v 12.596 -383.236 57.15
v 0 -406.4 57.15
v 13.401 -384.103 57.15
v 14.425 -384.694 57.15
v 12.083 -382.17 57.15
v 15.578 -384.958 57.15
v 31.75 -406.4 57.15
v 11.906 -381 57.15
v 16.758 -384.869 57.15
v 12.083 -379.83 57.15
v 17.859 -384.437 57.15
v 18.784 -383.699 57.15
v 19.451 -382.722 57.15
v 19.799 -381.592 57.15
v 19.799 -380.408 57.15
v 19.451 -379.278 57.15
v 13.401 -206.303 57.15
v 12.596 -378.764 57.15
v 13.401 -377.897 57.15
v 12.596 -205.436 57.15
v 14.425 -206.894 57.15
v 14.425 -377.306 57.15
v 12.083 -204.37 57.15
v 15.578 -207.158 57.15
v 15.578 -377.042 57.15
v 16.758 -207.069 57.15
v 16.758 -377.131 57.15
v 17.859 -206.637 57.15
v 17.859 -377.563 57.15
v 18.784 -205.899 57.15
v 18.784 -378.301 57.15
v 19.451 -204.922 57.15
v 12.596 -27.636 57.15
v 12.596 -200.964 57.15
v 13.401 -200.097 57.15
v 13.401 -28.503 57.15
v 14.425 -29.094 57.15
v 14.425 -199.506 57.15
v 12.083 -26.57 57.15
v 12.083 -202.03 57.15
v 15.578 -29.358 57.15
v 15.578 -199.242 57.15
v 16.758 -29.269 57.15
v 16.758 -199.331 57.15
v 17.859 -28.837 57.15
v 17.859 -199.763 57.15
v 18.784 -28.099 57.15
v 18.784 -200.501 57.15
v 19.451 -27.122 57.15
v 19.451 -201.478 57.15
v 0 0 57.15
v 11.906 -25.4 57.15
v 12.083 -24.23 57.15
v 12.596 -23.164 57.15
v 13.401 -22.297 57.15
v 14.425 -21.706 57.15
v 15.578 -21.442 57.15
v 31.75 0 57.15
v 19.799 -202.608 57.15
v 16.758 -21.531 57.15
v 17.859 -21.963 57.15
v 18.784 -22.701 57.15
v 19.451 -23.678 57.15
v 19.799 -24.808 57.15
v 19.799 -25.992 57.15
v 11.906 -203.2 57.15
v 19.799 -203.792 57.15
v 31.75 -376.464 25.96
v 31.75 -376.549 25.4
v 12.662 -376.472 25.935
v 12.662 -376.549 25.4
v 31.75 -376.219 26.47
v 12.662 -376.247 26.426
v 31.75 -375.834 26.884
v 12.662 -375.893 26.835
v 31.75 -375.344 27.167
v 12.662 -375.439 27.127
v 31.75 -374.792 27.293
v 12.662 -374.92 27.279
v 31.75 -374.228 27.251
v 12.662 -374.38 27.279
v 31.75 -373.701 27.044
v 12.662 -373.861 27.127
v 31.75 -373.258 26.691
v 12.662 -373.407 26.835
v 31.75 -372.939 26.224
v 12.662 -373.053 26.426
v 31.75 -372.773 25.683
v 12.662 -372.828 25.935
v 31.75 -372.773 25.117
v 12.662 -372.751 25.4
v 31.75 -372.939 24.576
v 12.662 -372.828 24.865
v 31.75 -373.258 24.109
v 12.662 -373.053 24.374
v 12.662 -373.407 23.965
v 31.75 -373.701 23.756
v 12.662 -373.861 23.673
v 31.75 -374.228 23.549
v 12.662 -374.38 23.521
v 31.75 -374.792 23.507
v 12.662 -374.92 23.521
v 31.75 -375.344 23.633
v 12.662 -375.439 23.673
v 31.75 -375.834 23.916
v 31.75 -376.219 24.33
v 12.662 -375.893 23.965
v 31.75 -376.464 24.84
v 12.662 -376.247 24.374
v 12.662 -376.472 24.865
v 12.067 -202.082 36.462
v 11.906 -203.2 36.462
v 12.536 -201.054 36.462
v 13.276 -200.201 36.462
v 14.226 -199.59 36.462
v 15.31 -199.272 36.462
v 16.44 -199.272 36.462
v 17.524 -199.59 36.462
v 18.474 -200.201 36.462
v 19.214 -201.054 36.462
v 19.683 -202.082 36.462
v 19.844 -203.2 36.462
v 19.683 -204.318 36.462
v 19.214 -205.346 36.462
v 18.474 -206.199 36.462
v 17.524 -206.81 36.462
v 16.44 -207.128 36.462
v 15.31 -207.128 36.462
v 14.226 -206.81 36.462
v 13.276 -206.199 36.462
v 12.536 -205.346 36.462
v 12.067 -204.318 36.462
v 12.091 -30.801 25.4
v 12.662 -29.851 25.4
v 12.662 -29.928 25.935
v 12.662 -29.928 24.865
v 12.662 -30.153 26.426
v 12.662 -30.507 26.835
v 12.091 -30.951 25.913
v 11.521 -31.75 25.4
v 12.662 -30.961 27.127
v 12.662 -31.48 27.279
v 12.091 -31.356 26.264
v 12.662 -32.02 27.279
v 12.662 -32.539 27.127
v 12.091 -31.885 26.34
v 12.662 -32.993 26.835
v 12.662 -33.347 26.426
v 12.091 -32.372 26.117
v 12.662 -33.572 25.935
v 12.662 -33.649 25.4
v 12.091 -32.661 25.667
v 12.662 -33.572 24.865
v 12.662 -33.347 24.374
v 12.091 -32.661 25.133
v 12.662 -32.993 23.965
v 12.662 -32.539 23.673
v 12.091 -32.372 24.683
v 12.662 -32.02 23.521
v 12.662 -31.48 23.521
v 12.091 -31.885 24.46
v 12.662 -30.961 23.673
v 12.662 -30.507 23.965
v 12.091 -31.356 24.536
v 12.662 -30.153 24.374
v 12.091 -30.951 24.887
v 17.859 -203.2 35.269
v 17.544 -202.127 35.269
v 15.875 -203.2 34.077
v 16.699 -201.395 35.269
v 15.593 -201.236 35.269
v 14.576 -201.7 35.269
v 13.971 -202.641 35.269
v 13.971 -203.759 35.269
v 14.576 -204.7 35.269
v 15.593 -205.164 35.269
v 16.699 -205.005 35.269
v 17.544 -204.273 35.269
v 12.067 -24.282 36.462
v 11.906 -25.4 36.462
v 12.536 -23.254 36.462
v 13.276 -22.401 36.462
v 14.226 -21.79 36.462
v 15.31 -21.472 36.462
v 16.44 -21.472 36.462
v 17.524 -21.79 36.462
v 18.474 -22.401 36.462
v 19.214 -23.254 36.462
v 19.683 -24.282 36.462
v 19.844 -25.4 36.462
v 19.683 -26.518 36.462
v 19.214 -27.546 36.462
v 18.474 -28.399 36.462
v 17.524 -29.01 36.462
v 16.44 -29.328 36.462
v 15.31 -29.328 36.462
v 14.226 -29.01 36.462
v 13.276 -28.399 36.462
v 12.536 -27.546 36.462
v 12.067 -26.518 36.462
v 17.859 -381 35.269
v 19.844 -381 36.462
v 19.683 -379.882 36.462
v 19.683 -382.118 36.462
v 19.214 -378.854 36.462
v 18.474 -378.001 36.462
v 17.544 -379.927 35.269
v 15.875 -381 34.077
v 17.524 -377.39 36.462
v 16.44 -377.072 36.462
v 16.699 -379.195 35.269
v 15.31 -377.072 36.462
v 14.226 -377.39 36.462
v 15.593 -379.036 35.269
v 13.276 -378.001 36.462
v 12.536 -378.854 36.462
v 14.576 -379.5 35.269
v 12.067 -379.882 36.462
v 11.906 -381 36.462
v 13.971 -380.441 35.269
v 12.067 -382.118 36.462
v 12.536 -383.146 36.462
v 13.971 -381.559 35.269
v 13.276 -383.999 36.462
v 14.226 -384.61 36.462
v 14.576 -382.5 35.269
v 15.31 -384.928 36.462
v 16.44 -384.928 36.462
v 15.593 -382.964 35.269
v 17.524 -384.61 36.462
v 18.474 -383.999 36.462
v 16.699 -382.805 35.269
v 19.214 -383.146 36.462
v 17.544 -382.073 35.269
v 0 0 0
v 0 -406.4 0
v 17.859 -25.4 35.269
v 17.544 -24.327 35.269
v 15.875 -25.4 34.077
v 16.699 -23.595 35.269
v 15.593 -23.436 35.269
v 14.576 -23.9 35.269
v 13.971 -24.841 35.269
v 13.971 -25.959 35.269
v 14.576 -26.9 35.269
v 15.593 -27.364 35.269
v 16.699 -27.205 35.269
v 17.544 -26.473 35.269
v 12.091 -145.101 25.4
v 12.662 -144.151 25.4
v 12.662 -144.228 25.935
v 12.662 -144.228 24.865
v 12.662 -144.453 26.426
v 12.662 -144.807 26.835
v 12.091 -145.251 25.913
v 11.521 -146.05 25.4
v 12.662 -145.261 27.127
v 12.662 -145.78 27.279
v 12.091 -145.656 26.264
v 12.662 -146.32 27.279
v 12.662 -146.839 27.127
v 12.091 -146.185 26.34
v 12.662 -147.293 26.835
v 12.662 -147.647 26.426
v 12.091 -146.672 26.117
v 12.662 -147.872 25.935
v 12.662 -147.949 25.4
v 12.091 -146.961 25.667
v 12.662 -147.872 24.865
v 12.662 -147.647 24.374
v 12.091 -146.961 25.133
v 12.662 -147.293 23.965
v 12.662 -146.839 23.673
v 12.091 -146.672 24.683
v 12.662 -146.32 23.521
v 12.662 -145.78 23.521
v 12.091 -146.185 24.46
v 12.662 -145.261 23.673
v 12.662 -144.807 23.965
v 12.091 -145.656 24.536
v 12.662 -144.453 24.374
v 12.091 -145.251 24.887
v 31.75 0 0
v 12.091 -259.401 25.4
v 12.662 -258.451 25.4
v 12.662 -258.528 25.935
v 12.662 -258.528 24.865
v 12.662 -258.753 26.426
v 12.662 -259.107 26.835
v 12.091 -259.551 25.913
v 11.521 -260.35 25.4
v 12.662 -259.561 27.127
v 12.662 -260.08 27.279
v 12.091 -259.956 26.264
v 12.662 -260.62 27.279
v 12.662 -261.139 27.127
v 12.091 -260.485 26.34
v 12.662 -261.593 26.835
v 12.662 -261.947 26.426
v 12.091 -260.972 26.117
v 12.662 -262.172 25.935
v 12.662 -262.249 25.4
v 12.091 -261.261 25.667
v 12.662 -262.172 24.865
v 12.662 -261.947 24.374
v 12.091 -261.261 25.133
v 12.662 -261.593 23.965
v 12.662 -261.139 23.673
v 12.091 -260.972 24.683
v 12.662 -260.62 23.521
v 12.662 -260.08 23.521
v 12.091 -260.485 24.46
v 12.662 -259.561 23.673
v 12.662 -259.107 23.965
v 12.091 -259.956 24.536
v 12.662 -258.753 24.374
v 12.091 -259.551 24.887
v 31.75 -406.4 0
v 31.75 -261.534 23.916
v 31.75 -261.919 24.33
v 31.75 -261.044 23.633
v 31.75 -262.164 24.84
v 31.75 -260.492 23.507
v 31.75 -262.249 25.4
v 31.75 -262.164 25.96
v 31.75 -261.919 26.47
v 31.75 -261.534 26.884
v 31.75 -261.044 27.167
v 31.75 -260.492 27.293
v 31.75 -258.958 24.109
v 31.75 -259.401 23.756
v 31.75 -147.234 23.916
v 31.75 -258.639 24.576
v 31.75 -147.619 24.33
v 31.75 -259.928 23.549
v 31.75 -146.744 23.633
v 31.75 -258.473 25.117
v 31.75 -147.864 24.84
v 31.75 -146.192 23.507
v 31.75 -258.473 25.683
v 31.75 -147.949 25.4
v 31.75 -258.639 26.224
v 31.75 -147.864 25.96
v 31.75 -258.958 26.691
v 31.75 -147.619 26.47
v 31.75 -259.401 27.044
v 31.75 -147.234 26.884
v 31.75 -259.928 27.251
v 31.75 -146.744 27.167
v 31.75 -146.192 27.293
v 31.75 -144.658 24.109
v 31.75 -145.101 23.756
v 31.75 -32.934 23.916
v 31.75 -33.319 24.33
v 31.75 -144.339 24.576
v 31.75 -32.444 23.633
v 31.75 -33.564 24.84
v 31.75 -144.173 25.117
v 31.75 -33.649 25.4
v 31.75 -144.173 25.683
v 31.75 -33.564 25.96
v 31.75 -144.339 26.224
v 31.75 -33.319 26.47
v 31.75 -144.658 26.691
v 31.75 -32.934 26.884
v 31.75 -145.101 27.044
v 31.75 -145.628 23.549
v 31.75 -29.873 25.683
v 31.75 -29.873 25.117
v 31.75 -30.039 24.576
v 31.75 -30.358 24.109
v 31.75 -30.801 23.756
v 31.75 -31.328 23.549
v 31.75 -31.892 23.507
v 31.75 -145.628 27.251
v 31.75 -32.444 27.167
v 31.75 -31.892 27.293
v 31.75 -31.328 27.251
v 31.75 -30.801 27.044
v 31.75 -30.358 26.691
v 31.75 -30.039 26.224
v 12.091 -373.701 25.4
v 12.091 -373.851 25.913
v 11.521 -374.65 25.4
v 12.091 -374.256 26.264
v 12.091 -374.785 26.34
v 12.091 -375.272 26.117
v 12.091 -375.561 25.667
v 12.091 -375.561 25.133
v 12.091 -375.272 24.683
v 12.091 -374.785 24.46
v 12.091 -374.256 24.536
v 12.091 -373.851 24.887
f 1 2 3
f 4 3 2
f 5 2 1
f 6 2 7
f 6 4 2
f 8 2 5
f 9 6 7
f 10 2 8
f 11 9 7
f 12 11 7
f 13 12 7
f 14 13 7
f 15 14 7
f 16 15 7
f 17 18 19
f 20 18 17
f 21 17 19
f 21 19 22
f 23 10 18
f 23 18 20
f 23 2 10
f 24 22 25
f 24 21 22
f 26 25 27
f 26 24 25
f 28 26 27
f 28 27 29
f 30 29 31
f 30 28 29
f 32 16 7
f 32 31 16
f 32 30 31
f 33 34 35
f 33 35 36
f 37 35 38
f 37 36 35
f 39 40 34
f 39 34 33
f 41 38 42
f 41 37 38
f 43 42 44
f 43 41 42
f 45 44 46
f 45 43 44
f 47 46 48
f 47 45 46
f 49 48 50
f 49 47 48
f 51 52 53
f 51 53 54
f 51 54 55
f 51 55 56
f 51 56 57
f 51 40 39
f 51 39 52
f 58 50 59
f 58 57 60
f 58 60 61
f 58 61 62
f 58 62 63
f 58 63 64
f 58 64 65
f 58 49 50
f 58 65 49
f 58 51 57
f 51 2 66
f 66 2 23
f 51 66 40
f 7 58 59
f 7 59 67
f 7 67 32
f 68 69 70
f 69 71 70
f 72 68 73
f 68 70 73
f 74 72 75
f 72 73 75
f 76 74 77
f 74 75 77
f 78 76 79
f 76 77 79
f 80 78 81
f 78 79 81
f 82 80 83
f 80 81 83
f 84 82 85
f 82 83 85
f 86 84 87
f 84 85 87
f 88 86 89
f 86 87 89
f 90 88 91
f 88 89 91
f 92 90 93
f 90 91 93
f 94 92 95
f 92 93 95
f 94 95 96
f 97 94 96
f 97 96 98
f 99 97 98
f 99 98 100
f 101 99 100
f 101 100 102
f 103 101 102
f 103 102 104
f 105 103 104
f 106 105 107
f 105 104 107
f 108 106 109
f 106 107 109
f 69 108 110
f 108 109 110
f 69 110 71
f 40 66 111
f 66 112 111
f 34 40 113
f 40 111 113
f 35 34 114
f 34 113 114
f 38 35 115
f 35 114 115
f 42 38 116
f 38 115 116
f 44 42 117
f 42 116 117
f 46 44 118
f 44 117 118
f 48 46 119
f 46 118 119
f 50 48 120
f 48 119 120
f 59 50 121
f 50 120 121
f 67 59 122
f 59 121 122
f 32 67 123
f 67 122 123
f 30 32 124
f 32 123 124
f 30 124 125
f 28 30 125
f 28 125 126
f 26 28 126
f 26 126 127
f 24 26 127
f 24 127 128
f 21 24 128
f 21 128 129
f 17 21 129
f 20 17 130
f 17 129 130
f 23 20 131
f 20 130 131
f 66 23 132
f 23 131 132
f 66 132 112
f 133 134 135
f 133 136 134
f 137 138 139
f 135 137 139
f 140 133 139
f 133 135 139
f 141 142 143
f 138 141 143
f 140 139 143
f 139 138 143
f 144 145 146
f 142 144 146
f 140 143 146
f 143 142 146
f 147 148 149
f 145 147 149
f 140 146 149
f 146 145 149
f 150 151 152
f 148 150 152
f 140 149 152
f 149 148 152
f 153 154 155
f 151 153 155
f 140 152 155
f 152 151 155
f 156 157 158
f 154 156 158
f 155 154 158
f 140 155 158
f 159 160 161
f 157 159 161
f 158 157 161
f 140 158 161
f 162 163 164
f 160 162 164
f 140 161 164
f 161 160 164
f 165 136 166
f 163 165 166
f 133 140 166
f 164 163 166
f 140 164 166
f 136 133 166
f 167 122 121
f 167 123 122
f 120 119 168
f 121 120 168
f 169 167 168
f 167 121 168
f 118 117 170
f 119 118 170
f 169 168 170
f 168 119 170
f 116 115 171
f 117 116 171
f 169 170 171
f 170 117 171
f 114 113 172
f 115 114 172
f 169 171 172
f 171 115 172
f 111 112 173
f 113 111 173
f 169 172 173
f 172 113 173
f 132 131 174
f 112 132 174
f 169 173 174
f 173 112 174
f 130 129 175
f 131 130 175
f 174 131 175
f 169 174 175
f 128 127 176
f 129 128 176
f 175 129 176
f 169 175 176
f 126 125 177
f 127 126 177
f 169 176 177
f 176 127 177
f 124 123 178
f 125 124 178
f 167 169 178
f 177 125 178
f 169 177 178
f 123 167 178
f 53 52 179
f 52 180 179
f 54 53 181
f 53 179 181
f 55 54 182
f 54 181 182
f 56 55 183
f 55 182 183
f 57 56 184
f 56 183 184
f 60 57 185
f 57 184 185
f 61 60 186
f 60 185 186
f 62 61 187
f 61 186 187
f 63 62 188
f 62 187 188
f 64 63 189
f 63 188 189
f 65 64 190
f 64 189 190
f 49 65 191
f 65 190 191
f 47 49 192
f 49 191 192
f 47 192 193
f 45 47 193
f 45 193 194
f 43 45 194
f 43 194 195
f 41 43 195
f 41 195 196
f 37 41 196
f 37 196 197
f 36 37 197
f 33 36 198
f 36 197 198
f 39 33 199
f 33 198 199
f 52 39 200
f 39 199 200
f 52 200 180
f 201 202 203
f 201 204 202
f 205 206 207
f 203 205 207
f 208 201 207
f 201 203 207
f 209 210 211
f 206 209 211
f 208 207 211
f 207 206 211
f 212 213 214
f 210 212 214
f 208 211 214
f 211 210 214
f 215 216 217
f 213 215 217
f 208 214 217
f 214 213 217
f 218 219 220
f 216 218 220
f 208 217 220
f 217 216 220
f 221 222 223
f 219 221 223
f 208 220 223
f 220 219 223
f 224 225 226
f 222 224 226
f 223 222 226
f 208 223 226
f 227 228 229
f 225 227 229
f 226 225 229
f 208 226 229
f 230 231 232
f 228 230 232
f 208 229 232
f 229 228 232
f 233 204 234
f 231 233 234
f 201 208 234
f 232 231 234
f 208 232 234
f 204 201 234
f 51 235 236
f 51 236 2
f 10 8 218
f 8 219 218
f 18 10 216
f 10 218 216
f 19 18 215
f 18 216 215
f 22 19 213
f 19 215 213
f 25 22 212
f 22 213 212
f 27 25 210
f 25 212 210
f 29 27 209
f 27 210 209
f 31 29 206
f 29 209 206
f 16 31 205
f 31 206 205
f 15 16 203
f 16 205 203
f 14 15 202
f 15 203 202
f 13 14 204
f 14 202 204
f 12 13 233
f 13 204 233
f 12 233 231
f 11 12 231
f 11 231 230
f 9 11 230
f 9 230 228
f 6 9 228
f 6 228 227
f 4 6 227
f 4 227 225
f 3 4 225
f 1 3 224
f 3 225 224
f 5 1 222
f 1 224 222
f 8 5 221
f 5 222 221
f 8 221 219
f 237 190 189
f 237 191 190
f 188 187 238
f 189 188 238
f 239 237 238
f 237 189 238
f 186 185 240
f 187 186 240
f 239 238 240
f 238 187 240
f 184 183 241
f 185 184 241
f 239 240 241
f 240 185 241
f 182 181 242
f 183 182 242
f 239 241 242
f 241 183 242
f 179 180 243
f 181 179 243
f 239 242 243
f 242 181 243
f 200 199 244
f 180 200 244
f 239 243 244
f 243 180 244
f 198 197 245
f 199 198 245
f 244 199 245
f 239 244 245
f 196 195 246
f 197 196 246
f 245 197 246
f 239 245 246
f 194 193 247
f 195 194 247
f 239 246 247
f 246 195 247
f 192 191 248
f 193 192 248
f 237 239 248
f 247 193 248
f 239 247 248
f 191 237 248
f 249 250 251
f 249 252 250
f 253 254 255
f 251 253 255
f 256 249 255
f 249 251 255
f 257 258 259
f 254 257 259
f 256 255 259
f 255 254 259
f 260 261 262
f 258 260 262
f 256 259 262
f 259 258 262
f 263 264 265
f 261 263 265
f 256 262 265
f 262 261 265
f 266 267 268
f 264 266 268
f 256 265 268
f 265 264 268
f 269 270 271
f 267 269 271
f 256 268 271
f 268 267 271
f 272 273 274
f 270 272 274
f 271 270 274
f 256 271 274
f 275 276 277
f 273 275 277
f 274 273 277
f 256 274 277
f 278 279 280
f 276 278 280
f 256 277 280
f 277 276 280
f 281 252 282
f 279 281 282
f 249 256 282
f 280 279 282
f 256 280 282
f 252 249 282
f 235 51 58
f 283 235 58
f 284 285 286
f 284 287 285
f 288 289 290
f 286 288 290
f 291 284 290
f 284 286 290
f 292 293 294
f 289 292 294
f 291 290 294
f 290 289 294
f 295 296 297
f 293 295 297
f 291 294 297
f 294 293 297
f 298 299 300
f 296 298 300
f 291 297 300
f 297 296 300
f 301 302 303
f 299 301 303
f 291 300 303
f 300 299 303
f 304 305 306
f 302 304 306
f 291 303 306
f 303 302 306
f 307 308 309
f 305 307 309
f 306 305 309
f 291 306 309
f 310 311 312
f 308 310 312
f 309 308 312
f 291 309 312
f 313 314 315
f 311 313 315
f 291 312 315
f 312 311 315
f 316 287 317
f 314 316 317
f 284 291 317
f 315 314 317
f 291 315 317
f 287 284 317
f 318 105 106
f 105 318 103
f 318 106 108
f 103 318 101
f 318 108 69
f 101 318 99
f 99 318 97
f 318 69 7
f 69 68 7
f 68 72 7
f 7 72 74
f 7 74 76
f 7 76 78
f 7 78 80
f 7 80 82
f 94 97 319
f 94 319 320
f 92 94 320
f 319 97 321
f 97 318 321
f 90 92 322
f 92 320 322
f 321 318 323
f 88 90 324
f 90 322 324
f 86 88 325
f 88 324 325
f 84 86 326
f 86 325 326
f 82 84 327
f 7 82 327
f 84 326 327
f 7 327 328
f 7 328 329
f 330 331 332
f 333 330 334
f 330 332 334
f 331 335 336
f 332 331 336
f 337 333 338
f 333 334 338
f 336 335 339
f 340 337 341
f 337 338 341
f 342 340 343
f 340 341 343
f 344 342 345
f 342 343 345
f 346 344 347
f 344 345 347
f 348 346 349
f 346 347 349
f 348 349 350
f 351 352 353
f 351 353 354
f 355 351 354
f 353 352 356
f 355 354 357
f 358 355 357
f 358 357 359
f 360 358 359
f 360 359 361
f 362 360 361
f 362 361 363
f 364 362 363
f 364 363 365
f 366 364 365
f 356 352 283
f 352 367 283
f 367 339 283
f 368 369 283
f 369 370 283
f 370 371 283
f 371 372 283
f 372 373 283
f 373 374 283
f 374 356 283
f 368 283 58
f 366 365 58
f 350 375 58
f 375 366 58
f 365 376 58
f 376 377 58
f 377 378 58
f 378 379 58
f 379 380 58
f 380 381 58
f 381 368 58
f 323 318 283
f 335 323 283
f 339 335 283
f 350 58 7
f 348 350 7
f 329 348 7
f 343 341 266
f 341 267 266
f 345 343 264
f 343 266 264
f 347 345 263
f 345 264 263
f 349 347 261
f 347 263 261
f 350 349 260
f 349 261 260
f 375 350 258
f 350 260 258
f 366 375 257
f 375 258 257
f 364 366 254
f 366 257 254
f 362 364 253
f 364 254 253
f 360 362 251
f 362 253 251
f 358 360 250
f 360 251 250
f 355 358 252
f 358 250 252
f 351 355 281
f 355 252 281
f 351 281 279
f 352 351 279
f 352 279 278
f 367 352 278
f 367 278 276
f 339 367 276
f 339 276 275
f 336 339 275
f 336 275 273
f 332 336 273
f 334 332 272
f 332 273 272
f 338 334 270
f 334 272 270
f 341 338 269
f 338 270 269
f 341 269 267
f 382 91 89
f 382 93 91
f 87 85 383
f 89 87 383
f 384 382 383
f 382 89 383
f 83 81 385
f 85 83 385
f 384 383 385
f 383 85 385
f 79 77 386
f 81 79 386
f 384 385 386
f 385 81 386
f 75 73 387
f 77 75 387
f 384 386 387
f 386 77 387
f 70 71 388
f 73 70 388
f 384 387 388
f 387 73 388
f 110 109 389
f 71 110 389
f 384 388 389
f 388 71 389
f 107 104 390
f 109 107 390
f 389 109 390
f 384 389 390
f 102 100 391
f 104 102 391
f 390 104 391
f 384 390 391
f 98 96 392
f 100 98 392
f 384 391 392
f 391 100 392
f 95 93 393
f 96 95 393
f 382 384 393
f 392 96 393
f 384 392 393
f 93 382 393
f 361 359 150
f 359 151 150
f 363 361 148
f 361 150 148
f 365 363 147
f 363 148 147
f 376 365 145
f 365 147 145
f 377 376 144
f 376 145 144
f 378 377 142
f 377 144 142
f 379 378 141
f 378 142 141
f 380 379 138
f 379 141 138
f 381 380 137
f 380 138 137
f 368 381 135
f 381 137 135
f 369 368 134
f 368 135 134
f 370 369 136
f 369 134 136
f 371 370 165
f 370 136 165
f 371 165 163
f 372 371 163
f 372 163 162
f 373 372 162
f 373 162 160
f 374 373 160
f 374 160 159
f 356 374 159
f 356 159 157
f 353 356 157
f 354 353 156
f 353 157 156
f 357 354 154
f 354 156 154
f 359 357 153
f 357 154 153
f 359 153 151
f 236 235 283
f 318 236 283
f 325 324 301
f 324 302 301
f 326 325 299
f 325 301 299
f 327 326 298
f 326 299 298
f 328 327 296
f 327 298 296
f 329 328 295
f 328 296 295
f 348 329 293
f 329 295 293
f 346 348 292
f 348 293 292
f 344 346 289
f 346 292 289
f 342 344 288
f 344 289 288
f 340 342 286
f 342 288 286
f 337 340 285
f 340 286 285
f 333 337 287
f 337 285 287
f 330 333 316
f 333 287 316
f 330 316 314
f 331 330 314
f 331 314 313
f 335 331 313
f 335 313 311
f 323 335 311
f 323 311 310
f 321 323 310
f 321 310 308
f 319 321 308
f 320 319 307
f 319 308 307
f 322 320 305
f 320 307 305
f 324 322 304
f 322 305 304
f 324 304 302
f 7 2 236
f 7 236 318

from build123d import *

# Parameters (mm, degrees)
F0_W     = 31.75
F0_H     = 57.15
F1_DEPTH = 406.4
F4_D     = 7.9375
F4_DEPTH = 20.6883
F4_TIP   = 2.3846655818
F5_D     = 3.7973
F5_DEPTH = 19.0881
F5_TIP   = 1.1408240143


with BuildPart() as f1:
    # F0 (on Front) → F1 (new body)
    with BuildSketch(Plane.XZ):
        with Locations((15.875, 28.575)):
            Rectangle(F0_W, F0_H)
    extrude(amount=F1_DEPTH)

    # F4
    with Locations(Plane.XY.offset(57.15)):
        with Locations((15.875, -381), (15.875, -203.2), (15.875, -25.4)):
            Hole(F4_D / 2, depth=F4_DEPTH)
            with Locations((0, 0, -(F4_DEPTH + F4_TIP / 2))):  # 118° drill point
                Cone(0, F4_D / 2, F4_TIP, mode=Mode.SUBTRACT)

    # F5
    with Locations(Plane.YZ.offset(31.75)):
        with Locations((-374.65, 25.4), (-146.05, 25.4), (-31.75, 25.4), (-260.35, 25.4)):
            Hole(F5_D / 2, depth=F5_DEPTH)
            with Locations((0, 0, -(F5_DEPTH + F5_TIP / 2))):  # 118° drill point
                Cone(0, F5_D / 2, F5_TIP, mode=Mode.SUBTRACT)


solid = f1.part
